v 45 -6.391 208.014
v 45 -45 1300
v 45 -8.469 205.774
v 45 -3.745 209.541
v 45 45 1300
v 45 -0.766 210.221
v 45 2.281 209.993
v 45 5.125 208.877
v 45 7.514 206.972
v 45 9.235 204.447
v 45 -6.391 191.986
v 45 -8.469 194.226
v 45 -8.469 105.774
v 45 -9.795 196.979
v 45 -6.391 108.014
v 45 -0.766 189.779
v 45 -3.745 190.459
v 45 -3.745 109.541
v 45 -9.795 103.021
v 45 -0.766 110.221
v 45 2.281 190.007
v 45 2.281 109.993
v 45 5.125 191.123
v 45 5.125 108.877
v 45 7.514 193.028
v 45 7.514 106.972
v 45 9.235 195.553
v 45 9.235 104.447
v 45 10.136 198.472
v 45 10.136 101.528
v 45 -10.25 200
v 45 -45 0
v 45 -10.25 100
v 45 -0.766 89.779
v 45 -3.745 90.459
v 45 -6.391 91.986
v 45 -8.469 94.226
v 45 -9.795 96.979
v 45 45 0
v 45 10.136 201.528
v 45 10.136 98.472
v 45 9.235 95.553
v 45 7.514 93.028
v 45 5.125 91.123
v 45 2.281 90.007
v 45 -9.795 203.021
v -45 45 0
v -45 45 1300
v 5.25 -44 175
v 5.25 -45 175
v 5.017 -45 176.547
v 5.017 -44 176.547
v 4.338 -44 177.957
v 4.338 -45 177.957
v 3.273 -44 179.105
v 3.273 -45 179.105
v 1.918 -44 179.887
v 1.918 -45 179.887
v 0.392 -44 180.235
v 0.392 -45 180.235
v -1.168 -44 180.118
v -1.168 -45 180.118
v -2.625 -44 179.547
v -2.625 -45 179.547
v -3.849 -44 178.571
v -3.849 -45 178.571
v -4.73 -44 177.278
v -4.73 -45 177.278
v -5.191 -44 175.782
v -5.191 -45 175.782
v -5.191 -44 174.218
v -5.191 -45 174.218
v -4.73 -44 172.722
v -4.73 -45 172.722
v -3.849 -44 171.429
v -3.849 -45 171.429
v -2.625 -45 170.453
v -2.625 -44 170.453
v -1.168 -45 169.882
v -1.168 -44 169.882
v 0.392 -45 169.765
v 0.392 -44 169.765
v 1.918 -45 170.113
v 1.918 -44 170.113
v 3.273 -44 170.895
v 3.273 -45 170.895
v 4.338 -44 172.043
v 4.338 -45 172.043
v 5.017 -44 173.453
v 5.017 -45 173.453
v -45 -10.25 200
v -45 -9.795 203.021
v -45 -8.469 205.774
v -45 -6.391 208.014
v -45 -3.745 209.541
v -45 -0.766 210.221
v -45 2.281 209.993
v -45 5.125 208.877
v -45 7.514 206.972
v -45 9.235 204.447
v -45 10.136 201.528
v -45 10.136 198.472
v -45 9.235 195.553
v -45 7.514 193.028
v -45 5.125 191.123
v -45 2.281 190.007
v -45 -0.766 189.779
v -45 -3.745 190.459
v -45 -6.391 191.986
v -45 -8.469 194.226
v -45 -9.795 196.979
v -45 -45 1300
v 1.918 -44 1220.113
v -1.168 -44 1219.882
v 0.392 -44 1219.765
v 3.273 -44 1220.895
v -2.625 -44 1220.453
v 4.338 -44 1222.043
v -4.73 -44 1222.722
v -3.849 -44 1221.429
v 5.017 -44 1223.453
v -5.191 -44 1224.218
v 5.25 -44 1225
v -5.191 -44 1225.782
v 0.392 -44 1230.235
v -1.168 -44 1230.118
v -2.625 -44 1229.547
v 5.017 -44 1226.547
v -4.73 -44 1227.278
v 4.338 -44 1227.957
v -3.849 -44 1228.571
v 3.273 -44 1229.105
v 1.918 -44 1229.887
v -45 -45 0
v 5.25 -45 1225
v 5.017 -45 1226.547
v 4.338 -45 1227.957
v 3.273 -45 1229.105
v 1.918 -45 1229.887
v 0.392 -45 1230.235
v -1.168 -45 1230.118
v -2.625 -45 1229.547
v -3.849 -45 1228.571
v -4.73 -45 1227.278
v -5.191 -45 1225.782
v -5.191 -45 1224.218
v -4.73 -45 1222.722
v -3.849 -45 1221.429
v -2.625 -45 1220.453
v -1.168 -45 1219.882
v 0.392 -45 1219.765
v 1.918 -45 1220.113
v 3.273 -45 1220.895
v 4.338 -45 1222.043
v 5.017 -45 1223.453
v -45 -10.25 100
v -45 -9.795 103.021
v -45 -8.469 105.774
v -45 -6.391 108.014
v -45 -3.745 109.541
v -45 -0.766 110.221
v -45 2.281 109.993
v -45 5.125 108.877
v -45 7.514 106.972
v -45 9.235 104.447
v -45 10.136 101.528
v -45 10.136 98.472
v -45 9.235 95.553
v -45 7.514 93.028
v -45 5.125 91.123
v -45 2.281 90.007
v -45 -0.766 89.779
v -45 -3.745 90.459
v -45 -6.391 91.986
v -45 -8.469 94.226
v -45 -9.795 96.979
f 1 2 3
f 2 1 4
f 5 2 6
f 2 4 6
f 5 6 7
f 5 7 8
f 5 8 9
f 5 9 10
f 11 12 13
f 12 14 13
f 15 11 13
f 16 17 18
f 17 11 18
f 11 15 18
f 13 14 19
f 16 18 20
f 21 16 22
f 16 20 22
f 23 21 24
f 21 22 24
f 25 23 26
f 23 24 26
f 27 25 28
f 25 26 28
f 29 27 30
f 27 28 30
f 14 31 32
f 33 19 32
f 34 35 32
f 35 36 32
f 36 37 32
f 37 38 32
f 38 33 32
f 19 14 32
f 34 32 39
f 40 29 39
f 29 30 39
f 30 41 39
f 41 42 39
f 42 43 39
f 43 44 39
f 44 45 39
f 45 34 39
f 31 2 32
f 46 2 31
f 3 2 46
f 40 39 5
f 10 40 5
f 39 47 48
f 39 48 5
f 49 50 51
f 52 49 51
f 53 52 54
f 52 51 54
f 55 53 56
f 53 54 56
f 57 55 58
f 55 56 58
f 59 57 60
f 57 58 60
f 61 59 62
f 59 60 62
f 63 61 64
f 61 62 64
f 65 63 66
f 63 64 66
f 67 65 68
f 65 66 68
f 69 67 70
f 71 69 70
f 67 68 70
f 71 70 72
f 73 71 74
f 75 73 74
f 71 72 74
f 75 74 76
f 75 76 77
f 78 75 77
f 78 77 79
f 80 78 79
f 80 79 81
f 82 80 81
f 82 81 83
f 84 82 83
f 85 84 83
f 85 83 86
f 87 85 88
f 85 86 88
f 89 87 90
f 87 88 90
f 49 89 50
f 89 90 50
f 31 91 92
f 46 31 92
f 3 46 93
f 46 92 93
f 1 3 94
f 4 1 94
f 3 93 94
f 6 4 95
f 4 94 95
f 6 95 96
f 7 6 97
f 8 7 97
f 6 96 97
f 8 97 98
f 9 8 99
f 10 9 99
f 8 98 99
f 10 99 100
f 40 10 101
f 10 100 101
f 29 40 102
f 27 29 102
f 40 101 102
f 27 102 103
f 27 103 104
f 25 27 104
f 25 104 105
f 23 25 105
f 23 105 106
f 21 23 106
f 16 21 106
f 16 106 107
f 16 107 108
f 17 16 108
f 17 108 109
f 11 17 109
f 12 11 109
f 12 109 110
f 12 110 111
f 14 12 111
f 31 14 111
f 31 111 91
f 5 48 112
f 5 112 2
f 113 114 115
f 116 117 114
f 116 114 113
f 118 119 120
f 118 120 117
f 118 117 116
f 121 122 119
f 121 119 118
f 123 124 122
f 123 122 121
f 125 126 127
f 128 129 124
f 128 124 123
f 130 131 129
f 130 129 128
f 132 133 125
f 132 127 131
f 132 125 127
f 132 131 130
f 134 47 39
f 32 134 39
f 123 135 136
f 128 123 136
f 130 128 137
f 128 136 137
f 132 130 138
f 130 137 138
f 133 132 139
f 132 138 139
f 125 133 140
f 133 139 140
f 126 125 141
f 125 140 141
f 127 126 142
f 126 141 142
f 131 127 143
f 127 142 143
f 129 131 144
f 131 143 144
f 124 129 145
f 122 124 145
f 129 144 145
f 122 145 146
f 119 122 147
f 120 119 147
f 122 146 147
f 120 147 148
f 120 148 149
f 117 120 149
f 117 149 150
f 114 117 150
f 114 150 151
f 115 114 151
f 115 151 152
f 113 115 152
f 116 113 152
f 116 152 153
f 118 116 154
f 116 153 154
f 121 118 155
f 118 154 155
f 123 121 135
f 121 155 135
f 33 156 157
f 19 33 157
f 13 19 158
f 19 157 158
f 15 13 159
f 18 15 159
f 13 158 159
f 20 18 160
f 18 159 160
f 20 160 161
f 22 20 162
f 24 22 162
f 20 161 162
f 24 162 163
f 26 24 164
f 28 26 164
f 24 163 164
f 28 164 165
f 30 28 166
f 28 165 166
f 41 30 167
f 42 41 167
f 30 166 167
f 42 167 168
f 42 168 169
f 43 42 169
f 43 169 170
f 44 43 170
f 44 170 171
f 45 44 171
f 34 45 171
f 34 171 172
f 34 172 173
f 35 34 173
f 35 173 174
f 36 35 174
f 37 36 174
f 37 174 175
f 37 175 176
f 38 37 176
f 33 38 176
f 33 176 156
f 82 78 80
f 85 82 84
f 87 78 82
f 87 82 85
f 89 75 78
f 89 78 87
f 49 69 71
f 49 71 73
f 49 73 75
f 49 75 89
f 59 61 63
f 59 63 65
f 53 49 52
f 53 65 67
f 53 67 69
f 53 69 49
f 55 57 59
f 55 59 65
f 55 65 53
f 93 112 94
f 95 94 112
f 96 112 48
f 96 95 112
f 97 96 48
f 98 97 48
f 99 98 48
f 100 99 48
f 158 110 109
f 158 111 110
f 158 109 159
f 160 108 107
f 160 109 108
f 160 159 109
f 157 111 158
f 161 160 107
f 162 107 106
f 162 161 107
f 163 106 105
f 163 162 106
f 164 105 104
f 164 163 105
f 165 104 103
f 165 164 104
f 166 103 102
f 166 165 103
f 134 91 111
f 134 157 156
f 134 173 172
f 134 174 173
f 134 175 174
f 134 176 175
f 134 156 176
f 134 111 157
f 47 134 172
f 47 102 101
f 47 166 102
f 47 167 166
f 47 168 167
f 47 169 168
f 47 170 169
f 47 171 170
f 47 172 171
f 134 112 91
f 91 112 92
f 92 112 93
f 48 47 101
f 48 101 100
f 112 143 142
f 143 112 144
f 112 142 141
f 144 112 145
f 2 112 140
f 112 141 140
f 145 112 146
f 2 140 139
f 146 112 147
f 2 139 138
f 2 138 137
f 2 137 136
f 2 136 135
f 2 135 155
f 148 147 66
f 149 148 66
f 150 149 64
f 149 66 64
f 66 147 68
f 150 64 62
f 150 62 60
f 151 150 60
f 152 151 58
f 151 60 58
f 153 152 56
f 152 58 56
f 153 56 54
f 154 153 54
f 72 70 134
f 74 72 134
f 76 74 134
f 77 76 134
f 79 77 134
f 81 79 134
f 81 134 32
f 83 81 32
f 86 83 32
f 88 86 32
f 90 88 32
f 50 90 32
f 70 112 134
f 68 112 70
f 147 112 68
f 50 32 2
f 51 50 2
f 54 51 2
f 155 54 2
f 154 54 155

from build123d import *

# Parameters (mm, degrees)
F0_W     = 90
F0_H     = 90
F1_DEPTH = 1300
F2_R     = 5.25
F3_DEPTH = 1
F4_R     = 10.25
F5_DEPTH = 90.001


with BuildPart() as f1:
    # F0 (on Top) → F1 (new body)
    with BuildSketch(Plane.XY):
        Rectangle(F0_W, F0_H)
    extrude(amount=F1_DEPTH)

    # F2 (on face) → F3 (cut)
    with BuildSketch(Plane.XZ.offset(45)):
        with Locations((0, 1225)):
            Circle(F2_R)
        with Locations((0, 175)):
            Circle(F2_R)
    extrude(amount=-F3_DEPTH, mode=Mode.SUBTRACT)

    # F4 (on face) → F5 (cut, through all)
    with BuildSketch(Plane(origin=(-45, 0, 0), x_dir=(0, -1, 0), z_dir=(-1, 0, 0))):
        with Locations((0, 100)):
            Circle(F4_R)
        with Locations((0, 200)):
            Circle(F4_R)
    extrude(amount=-F5_DEPTH, mode=Mode.SUBTRACT)


solid = f1.part
